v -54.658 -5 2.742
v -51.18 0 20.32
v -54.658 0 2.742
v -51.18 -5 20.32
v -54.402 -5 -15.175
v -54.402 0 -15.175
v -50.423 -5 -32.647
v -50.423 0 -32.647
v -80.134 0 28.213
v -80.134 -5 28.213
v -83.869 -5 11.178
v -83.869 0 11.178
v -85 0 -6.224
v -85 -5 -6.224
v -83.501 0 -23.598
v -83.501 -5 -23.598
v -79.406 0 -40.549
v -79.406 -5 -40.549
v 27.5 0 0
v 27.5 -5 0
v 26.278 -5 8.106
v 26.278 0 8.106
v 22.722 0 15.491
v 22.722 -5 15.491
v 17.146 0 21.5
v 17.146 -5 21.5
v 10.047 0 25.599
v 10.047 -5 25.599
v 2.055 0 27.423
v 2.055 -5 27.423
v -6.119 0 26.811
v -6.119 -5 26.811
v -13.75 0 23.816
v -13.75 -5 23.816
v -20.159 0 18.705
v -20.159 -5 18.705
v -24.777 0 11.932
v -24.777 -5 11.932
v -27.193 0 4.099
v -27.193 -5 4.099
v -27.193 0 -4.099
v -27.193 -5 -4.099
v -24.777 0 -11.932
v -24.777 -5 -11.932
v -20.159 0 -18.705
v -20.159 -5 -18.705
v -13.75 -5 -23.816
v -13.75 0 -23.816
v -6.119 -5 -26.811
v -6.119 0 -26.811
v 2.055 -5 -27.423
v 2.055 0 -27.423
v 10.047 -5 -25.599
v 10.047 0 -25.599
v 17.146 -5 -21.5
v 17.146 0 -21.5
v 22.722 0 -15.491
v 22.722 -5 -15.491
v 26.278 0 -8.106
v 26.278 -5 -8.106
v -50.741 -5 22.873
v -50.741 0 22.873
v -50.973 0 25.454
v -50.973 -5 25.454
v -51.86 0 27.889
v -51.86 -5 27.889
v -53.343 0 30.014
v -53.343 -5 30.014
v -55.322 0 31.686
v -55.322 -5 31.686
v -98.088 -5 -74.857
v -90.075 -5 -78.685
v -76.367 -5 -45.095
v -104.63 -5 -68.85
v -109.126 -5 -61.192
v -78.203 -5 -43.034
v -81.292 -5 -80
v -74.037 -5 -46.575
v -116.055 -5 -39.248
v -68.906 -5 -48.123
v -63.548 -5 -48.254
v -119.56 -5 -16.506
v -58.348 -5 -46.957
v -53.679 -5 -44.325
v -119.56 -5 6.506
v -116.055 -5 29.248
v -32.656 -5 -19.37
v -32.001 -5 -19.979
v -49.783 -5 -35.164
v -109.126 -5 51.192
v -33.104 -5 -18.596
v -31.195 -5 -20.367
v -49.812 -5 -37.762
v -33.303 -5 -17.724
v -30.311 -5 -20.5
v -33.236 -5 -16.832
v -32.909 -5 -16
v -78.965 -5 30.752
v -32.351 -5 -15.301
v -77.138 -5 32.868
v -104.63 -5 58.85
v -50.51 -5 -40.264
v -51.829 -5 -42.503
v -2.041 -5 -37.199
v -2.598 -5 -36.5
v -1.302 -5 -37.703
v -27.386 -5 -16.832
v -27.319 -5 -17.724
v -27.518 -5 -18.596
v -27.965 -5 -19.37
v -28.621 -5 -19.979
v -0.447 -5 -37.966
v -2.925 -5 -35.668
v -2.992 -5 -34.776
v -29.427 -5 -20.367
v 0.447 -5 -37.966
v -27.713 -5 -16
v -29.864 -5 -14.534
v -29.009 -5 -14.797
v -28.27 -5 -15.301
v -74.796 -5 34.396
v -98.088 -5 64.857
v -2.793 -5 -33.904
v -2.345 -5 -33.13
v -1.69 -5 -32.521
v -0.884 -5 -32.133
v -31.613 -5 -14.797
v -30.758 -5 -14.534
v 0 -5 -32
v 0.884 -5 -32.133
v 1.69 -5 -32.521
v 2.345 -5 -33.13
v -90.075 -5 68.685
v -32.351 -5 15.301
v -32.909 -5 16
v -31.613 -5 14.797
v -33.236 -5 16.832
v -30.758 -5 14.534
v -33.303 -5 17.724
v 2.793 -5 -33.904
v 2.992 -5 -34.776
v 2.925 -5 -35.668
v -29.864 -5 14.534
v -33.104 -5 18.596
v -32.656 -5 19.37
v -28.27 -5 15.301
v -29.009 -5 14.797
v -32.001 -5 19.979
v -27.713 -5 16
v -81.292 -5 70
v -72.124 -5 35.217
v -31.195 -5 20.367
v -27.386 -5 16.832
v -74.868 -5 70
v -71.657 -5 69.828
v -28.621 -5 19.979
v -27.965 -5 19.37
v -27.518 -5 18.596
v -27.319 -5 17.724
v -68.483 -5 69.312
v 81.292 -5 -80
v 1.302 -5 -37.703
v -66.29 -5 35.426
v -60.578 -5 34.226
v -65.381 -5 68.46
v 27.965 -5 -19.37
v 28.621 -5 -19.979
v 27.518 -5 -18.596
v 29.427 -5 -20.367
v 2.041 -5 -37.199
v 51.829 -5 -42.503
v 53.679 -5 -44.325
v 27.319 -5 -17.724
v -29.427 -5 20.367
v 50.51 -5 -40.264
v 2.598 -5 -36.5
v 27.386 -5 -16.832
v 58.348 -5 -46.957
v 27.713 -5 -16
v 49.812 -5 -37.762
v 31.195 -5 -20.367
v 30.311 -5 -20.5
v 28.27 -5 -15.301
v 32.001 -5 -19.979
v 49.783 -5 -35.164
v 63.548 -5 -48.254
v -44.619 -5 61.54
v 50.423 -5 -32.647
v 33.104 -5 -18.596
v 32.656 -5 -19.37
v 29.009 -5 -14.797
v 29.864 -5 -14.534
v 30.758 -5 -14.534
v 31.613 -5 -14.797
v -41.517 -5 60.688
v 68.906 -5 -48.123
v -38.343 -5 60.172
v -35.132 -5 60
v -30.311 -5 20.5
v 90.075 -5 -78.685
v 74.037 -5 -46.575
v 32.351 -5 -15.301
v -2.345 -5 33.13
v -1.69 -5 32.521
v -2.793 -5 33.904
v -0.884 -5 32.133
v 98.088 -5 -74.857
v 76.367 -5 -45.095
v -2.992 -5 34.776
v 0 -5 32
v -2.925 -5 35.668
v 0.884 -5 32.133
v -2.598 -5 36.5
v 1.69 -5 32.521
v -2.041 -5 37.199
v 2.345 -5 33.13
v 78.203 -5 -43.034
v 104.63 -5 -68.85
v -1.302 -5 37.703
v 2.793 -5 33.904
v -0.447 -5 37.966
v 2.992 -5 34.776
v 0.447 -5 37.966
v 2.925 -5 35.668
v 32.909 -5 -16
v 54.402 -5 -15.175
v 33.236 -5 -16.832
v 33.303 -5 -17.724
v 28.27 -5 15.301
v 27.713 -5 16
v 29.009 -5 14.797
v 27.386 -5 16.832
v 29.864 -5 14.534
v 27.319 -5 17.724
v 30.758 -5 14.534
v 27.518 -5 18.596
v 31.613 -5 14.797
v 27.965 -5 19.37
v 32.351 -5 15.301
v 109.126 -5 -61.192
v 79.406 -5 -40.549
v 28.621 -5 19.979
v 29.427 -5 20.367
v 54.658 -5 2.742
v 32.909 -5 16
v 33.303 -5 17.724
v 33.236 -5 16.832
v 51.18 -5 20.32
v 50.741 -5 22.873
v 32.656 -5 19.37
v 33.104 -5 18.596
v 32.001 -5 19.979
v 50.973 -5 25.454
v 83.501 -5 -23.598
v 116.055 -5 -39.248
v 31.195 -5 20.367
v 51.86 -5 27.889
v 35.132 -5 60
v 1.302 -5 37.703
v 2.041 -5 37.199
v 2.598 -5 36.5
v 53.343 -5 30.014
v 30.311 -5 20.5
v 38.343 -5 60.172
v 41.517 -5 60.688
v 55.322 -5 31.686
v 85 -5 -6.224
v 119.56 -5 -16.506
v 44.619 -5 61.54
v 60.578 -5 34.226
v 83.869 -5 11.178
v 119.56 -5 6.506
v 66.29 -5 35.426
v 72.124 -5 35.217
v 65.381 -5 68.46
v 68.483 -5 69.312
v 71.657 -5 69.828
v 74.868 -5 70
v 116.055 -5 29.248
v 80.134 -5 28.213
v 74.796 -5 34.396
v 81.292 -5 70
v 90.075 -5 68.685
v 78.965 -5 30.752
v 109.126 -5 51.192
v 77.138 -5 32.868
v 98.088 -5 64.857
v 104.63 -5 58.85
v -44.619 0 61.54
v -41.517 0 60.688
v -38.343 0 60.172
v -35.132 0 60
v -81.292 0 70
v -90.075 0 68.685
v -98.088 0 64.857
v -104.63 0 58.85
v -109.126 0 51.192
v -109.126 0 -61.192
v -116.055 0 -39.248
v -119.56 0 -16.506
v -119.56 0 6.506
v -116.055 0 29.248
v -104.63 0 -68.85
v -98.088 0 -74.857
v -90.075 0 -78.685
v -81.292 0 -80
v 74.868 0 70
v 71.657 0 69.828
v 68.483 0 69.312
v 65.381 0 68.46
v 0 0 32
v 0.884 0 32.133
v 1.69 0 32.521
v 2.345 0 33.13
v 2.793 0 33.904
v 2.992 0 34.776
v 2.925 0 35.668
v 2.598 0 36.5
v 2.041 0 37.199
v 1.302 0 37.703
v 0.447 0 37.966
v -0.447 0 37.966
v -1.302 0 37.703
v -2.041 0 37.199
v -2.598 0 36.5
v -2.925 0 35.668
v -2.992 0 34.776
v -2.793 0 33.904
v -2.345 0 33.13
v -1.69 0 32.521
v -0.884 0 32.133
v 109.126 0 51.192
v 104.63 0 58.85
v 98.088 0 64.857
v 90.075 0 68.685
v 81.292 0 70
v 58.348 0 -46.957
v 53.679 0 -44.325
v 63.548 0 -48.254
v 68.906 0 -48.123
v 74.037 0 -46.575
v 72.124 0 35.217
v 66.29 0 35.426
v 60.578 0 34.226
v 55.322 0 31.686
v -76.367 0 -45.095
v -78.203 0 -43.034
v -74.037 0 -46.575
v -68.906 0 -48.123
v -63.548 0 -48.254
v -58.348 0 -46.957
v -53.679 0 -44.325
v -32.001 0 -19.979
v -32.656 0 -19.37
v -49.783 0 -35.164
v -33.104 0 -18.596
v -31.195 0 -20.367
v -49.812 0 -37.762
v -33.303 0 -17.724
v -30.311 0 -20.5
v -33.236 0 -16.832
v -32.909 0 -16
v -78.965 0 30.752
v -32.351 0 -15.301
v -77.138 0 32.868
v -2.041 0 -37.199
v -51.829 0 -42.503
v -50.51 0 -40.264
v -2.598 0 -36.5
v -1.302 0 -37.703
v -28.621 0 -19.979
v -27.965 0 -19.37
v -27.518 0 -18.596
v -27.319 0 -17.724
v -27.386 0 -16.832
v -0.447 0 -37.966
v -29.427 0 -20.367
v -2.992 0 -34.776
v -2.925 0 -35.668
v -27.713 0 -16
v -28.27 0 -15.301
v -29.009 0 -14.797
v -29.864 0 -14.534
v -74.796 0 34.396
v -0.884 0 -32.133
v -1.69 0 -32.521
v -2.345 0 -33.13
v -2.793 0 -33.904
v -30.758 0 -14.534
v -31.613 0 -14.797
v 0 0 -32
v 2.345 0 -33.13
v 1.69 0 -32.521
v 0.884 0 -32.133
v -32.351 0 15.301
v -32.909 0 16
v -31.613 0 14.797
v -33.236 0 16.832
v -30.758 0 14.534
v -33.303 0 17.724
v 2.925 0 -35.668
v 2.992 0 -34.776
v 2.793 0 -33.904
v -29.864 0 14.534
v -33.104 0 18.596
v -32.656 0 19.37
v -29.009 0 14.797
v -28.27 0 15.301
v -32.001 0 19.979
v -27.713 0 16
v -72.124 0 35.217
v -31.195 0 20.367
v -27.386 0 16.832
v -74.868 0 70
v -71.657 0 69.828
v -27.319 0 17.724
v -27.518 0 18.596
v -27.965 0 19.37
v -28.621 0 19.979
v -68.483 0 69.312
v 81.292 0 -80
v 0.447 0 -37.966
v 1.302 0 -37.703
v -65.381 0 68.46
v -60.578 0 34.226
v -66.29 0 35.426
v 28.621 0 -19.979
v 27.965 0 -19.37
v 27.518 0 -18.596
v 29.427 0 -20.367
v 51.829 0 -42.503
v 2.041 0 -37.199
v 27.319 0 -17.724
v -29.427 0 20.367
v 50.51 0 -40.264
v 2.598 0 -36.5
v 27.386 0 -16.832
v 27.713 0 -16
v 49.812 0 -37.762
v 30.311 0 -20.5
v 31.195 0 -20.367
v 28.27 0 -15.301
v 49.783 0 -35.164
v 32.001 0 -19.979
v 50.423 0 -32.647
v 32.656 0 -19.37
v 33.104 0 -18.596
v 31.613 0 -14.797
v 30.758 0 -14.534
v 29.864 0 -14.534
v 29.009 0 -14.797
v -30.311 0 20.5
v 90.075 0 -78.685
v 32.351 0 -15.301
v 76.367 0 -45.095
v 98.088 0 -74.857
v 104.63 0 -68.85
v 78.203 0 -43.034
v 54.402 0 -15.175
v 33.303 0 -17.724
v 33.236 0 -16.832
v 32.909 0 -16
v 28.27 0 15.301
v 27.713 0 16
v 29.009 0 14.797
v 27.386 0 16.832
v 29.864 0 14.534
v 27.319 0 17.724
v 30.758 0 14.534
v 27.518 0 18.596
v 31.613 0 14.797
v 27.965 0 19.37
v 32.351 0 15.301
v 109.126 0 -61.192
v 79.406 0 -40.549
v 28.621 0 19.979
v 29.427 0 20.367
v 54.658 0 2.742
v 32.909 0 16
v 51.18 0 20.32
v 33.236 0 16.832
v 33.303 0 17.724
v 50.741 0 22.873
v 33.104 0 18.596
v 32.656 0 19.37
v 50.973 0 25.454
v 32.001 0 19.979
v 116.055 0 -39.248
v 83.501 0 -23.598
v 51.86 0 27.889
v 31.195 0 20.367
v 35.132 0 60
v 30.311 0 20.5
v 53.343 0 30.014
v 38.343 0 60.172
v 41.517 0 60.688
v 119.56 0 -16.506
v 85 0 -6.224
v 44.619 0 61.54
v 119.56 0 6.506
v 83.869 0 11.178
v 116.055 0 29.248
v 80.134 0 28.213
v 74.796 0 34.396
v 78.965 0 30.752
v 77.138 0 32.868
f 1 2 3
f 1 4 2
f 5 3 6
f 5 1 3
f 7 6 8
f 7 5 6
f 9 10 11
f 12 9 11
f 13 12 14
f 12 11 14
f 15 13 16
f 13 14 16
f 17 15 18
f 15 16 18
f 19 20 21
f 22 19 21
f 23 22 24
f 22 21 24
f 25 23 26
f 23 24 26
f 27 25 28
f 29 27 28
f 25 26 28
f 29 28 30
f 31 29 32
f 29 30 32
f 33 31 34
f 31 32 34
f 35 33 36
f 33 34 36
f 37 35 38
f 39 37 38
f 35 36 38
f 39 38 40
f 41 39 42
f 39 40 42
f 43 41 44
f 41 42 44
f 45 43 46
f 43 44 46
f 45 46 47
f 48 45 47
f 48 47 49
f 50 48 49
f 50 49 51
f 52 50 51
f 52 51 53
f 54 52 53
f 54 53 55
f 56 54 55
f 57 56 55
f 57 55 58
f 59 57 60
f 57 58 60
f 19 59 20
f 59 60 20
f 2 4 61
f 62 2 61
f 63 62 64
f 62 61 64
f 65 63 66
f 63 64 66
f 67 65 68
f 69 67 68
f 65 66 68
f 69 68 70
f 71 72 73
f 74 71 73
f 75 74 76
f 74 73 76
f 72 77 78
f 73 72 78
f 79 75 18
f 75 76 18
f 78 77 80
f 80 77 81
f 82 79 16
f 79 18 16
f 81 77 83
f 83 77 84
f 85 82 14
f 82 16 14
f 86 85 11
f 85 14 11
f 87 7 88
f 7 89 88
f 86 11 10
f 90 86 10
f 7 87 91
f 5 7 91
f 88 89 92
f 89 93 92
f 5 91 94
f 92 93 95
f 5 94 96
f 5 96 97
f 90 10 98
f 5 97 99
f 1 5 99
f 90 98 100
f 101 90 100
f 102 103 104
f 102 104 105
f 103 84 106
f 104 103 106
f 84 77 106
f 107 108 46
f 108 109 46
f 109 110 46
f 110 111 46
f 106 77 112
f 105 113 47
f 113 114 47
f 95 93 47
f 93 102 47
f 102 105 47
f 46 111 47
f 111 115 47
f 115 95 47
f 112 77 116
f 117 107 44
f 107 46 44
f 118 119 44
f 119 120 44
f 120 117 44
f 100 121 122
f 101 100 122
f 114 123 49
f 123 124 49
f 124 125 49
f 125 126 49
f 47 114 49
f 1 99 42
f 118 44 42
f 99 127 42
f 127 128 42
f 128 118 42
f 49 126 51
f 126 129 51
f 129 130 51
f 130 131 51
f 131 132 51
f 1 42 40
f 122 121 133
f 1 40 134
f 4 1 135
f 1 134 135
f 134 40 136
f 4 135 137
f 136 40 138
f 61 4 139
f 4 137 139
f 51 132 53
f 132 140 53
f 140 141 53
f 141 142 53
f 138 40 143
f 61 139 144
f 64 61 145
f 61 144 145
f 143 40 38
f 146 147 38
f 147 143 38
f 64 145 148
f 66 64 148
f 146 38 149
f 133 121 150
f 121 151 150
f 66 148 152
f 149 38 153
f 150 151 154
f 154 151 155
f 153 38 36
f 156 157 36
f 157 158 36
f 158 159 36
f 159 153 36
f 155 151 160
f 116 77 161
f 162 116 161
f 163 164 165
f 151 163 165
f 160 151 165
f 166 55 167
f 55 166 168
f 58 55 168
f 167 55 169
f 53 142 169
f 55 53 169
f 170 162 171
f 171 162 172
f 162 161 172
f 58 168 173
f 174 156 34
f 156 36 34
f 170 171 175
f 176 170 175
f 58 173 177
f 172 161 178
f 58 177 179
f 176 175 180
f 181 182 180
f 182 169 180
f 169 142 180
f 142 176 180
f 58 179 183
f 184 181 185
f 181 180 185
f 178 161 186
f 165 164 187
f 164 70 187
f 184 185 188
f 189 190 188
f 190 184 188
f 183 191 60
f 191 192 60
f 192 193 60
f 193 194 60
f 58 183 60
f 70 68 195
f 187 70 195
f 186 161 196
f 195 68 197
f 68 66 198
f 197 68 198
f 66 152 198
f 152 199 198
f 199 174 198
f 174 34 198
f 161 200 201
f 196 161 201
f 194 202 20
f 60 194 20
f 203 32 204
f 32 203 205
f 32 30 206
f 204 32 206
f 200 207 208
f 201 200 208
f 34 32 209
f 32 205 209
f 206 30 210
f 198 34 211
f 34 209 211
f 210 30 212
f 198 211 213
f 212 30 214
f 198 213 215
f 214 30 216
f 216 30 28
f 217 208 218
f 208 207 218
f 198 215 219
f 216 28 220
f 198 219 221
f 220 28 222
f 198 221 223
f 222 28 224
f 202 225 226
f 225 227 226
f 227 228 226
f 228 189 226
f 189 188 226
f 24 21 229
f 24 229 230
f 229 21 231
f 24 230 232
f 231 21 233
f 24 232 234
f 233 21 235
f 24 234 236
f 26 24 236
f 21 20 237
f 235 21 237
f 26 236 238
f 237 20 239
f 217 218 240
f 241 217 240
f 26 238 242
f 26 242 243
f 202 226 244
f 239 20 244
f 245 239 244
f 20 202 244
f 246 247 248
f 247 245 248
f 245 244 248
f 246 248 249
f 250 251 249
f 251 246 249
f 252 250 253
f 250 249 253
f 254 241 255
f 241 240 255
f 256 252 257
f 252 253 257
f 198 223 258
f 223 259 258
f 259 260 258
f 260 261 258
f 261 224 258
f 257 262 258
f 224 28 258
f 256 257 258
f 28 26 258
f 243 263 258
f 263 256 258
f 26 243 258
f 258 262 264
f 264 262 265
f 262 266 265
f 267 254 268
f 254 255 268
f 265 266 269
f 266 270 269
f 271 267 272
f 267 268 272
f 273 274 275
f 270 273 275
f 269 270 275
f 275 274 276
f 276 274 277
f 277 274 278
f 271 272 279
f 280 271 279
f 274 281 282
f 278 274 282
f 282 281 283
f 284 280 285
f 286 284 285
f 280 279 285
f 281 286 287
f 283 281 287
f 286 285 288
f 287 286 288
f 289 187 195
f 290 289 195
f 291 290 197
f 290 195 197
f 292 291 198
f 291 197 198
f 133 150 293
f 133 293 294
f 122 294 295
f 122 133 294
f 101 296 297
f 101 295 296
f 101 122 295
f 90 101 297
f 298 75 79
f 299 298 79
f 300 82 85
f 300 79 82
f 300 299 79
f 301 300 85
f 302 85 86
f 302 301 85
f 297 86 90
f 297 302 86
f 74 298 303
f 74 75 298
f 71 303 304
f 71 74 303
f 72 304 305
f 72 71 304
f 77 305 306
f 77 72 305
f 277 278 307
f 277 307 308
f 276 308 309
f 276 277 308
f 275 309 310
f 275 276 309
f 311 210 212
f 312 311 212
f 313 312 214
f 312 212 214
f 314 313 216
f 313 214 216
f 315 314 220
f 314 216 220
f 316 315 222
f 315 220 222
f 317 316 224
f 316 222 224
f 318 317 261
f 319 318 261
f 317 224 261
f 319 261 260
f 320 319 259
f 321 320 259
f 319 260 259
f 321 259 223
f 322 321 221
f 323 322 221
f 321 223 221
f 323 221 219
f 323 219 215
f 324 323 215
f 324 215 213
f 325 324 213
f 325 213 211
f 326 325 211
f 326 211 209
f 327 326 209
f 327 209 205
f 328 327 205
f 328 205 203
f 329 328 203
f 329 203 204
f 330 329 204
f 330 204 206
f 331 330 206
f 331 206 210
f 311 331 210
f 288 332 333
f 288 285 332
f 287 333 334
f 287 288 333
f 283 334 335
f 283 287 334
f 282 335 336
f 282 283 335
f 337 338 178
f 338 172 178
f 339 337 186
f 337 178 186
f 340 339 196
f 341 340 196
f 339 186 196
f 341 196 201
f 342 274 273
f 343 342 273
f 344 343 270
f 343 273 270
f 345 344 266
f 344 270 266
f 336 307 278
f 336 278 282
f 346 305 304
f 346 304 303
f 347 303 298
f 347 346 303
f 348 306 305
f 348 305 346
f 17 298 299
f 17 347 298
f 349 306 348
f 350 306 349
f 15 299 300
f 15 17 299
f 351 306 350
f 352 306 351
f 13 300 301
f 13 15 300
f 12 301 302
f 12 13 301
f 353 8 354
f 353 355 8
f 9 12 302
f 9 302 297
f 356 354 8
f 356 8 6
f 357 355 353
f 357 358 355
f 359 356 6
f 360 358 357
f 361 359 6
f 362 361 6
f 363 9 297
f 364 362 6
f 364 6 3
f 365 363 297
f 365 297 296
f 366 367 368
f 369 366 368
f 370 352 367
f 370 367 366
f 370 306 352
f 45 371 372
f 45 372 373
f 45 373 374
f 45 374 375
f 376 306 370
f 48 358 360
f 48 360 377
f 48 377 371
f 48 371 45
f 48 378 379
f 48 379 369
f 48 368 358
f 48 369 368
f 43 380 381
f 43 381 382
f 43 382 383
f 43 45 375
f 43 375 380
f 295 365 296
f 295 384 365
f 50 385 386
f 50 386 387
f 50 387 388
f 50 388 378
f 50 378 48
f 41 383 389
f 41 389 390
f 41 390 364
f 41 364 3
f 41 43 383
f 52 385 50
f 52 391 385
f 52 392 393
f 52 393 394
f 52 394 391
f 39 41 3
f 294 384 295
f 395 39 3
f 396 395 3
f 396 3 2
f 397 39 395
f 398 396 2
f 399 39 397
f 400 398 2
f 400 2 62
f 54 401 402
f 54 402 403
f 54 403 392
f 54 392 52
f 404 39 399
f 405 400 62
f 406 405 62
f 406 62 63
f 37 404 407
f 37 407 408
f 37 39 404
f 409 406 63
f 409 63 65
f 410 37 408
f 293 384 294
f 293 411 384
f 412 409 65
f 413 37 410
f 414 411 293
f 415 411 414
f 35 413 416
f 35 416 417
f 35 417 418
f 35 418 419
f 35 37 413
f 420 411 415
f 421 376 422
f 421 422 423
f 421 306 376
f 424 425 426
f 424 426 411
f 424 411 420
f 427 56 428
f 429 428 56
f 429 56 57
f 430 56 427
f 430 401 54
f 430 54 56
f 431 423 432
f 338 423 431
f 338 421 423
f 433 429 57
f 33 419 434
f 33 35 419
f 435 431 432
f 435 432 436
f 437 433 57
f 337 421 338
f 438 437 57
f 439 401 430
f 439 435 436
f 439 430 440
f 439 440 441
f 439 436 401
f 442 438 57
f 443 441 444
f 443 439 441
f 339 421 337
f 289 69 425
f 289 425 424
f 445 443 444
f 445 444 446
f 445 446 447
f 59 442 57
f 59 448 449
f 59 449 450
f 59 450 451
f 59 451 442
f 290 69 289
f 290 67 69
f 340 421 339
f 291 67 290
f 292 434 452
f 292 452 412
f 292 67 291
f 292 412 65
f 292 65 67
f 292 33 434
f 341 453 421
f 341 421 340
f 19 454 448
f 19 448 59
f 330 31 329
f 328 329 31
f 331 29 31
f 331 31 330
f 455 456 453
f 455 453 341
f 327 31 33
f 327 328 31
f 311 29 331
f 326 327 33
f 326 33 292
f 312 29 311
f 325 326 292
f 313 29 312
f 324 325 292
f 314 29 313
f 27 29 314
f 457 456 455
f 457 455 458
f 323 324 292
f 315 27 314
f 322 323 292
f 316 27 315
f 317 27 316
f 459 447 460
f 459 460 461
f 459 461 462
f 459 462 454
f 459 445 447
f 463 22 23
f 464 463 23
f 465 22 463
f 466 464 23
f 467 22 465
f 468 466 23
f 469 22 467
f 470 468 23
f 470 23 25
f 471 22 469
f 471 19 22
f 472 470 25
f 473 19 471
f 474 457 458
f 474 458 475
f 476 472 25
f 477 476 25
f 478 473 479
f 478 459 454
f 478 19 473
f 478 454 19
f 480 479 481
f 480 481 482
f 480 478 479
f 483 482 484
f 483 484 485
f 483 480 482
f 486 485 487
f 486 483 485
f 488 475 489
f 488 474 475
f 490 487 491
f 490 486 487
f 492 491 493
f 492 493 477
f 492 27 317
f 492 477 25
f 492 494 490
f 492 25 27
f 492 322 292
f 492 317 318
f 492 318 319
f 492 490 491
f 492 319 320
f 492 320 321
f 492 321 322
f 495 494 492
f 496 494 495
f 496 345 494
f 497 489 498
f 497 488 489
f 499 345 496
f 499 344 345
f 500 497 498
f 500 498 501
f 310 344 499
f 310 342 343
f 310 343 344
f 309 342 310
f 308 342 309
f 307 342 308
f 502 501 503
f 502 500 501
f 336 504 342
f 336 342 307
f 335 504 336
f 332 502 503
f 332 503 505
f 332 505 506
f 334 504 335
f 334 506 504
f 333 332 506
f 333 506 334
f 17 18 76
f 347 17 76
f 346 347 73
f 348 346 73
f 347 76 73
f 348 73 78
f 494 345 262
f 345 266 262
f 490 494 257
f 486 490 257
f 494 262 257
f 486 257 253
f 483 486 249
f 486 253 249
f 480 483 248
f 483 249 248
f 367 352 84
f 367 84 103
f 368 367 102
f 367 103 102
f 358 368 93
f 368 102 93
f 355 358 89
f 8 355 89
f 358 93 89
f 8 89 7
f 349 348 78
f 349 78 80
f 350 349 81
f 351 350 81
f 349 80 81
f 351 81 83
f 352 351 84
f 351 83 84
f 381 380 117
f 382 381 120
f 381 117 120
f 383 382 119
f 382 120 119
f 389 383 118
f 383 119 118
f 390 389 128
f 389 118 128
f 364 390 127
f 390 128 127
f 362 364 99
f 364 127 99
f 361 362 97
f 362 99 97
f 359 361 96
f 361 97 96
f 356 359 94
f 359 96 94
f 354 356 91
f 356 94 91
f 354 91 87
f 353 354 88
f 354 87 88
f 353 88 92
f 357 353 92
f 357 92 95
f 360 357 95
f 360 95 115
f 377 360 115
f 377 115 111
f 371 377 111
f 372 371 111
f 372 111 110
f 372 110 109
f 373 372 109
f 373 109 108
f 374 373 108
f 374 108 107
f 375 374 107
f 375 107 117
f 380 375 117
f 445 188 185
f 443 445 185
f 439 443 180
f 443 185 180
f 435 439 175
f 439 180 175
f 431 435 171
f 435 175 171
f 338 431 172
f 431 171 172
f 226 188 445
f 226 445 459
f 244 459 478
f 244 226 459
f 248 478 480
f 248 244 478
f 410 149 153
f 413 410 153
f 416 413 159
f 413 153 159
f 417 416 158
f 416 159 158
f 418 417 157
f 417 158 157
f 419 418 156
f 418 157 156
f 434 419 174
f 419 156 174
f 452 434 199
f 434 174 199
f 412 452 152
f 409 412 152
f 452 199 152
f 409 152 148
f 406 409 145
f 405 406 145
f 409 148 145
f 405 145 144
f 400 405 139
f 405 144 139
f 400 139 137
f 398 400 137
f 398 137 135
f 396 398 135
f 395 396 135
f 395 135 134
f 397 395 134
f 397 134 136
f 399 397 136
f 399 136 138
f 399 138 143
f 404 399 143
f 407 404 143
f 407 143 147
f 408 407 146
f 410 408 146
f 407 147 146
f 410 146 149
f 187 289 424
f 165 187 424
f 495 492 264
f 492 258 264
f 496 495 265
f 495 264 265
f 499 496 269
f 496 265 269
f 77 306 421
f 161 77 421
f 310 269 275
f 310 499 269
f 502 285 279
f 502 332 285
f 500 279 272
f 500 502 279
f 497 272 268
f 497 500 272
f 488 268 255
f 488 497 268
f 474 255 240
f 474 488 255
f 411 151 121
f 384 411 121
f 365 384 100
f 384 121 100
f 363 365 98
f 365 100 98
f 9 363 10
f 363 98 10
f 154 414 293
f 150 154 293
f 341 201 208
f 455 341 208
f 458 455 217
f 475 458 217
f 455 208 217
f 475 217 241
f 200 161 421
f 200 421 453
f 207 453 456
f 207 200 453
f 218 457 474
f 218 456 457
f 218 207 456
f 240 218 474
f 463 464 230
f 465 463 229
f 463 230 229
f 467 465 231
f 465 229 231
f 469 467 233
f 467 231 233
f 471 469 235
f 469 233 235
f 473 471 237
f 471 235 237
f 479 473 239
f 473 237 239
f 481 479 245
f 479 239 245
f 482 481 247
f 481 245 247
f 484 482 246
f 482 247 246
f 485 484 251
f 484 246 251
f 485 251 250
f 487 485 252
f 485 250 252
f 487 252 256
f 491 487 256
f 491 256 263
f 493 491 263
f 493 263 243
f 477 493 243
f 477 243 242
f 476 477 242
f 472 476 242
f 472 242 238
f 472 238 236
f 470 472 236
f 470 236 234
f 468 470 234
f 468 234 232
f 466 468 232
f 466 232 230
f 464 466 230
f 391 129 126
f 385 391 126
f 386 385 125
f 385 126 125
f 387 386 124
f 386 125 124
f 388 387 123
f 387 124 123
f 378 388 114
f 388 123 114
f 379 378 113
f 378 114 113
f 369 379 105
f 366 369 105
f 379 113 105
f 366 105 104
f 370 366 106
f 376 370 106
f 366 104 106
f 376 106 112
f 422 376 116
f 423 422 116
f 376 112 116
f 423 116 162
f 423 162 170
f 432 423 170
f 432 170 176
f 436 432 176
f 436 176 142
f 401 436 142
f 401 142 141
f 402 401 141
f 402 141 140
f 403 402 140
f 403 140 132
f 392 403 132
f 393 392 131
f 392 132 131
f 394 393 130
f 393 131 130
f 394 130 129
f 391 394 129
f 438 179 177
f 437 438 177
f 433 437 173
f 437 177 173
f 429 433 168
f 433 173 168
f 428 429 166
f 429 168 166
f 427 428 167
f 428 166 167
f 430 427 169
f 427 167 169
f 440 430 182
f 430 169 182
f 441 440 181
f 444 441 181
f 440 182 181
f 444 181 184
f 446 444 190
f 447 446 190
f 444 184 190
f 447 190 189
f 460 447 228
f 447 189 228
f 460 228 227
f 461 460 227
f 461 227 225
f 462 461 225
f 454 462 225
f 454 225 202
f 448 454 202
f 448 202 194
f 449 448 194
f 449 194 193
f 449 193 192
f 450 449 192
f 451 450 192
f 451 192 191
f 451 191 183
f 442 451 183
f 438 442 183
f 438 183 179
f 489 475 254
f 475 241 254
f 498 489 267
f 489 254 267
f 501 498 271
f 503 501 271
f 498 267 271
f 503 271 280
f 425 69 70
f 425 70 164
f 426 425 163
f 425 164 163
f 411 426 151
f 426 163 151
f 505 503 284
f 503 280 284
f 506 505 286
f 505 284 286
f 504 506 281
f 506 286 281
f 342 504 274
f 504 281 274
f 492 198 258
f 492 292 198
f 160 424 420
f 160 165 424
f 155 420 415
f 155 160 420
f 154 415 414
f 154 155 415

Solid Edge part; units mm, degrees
sketch "Sketch1" plane through (0, 0, 0) normal (0, -1, 0) x (1, 0, 0)
  line L0 (-40, 60) -> (40, 60)
  line L1 (40, 60) -> (70, 70)
  line L2 (70, 70) -> (100, 70)
  arc A0 (100, 70) -> (100, -80) centre (-30.625, -5) cw
  line L3 (-100, -80) -> (100, -80)
  arc A1 (-100, 70) -> (-100, -80) centre (30.625, -5) ccw
  line L4 (-70, 70) -> (-100, 70)
  line L5 (-40, 60) -> (-70, 70)
  dimension "D1" = 60
  dimension "D2" = 10
  dimension "D3" = 30
  dimension "D4" = 30
  dimension "D5" = 80
  dimension "D6" = 120
extrude "Protrusion1" add sketch "Sketch1" along normal blind 5
fillet "Round_1" radius 30 8 edges at (100, -2.5, -80) (-100, -2.5, -80) (-100, -2.5, 70) (-70, -2.5, 70) (-40, -2.5, 60) (40, -2.5, 60) (70, -2.5, 70) (100, -2.5, 70)
sketch "Sketch2" plane through (0, -5, -2.5) normal (0, -1, 0) x (1, 0, 0)
  circle A0 centre (0, 2.5) radius 27.5
  dimension "D1" = 55
extrude "ExtrudedCutout_1" cut sketch "Sketch2" against normal blind 45.5 and the other way blind 29.5
hole "Hole_1" at (0, -5, 35) direction (0, 1, 0) diameter 6 end up to next
pattern_circular "Pattern1" count 6 over 360 about axis through (0, -5, 0) along (0, 1, 0) of "Hole_1"
sketch "Sketch3" plane through (0, -5, -5) normal (0, -1, 0) x (1, 0, 0)
  arc A0 (-72.1237, 40.2166) -> (-55.3222, 36.6862) centre (-68.3481, 16.44) cw
  arc A1 (-55.3222, 36.6862) -> (-51.18, 25.3196) centre (-60.7329, 28.2764) cw
  arc A2 (-51.18, 25.3196) -> (-50.4231, -27.6469) centre (30.625, 0) ccw
  arc A3 (-53.6794, -39.3255) -> (-50.4231, -27.6469) centre (-59.7121, -31.3501) ccw
  arc A4 (-53.6794, -39.3255) -> (-74.0366, -41.5749) centre (-65.7448, -23.3747) cw
  arc A5 (-74.0366, -41.5749) -> (-79.4063, -35.5491) centre (-69.8907, -32.4748) cw
  arc A6 (-79.4063, -35.5491) -> (-80.134, 33.2126) centre (30.625, 0) cw
  arc A7 (-80.134, 33.2126) -> (-72.1237, 40.2166) centre (-70.5554, 30.3403) cw
  dimension "D1" = 30
  dimension "D2" = 30
  dimension "D3" = 10
  dimension "D4" = 10
  dimension "D5" = 20
extrude "ExtrudedCutout_2" cut sketch "Sketch3" against normal blind 23.5 and the other way blind 37.5
mirror "Mirror1" about plane through (0, 0, 0) normal (1, 0, 0) of "ExtrudedCutout_2"
properties material "Epoxy, cast rigid"
